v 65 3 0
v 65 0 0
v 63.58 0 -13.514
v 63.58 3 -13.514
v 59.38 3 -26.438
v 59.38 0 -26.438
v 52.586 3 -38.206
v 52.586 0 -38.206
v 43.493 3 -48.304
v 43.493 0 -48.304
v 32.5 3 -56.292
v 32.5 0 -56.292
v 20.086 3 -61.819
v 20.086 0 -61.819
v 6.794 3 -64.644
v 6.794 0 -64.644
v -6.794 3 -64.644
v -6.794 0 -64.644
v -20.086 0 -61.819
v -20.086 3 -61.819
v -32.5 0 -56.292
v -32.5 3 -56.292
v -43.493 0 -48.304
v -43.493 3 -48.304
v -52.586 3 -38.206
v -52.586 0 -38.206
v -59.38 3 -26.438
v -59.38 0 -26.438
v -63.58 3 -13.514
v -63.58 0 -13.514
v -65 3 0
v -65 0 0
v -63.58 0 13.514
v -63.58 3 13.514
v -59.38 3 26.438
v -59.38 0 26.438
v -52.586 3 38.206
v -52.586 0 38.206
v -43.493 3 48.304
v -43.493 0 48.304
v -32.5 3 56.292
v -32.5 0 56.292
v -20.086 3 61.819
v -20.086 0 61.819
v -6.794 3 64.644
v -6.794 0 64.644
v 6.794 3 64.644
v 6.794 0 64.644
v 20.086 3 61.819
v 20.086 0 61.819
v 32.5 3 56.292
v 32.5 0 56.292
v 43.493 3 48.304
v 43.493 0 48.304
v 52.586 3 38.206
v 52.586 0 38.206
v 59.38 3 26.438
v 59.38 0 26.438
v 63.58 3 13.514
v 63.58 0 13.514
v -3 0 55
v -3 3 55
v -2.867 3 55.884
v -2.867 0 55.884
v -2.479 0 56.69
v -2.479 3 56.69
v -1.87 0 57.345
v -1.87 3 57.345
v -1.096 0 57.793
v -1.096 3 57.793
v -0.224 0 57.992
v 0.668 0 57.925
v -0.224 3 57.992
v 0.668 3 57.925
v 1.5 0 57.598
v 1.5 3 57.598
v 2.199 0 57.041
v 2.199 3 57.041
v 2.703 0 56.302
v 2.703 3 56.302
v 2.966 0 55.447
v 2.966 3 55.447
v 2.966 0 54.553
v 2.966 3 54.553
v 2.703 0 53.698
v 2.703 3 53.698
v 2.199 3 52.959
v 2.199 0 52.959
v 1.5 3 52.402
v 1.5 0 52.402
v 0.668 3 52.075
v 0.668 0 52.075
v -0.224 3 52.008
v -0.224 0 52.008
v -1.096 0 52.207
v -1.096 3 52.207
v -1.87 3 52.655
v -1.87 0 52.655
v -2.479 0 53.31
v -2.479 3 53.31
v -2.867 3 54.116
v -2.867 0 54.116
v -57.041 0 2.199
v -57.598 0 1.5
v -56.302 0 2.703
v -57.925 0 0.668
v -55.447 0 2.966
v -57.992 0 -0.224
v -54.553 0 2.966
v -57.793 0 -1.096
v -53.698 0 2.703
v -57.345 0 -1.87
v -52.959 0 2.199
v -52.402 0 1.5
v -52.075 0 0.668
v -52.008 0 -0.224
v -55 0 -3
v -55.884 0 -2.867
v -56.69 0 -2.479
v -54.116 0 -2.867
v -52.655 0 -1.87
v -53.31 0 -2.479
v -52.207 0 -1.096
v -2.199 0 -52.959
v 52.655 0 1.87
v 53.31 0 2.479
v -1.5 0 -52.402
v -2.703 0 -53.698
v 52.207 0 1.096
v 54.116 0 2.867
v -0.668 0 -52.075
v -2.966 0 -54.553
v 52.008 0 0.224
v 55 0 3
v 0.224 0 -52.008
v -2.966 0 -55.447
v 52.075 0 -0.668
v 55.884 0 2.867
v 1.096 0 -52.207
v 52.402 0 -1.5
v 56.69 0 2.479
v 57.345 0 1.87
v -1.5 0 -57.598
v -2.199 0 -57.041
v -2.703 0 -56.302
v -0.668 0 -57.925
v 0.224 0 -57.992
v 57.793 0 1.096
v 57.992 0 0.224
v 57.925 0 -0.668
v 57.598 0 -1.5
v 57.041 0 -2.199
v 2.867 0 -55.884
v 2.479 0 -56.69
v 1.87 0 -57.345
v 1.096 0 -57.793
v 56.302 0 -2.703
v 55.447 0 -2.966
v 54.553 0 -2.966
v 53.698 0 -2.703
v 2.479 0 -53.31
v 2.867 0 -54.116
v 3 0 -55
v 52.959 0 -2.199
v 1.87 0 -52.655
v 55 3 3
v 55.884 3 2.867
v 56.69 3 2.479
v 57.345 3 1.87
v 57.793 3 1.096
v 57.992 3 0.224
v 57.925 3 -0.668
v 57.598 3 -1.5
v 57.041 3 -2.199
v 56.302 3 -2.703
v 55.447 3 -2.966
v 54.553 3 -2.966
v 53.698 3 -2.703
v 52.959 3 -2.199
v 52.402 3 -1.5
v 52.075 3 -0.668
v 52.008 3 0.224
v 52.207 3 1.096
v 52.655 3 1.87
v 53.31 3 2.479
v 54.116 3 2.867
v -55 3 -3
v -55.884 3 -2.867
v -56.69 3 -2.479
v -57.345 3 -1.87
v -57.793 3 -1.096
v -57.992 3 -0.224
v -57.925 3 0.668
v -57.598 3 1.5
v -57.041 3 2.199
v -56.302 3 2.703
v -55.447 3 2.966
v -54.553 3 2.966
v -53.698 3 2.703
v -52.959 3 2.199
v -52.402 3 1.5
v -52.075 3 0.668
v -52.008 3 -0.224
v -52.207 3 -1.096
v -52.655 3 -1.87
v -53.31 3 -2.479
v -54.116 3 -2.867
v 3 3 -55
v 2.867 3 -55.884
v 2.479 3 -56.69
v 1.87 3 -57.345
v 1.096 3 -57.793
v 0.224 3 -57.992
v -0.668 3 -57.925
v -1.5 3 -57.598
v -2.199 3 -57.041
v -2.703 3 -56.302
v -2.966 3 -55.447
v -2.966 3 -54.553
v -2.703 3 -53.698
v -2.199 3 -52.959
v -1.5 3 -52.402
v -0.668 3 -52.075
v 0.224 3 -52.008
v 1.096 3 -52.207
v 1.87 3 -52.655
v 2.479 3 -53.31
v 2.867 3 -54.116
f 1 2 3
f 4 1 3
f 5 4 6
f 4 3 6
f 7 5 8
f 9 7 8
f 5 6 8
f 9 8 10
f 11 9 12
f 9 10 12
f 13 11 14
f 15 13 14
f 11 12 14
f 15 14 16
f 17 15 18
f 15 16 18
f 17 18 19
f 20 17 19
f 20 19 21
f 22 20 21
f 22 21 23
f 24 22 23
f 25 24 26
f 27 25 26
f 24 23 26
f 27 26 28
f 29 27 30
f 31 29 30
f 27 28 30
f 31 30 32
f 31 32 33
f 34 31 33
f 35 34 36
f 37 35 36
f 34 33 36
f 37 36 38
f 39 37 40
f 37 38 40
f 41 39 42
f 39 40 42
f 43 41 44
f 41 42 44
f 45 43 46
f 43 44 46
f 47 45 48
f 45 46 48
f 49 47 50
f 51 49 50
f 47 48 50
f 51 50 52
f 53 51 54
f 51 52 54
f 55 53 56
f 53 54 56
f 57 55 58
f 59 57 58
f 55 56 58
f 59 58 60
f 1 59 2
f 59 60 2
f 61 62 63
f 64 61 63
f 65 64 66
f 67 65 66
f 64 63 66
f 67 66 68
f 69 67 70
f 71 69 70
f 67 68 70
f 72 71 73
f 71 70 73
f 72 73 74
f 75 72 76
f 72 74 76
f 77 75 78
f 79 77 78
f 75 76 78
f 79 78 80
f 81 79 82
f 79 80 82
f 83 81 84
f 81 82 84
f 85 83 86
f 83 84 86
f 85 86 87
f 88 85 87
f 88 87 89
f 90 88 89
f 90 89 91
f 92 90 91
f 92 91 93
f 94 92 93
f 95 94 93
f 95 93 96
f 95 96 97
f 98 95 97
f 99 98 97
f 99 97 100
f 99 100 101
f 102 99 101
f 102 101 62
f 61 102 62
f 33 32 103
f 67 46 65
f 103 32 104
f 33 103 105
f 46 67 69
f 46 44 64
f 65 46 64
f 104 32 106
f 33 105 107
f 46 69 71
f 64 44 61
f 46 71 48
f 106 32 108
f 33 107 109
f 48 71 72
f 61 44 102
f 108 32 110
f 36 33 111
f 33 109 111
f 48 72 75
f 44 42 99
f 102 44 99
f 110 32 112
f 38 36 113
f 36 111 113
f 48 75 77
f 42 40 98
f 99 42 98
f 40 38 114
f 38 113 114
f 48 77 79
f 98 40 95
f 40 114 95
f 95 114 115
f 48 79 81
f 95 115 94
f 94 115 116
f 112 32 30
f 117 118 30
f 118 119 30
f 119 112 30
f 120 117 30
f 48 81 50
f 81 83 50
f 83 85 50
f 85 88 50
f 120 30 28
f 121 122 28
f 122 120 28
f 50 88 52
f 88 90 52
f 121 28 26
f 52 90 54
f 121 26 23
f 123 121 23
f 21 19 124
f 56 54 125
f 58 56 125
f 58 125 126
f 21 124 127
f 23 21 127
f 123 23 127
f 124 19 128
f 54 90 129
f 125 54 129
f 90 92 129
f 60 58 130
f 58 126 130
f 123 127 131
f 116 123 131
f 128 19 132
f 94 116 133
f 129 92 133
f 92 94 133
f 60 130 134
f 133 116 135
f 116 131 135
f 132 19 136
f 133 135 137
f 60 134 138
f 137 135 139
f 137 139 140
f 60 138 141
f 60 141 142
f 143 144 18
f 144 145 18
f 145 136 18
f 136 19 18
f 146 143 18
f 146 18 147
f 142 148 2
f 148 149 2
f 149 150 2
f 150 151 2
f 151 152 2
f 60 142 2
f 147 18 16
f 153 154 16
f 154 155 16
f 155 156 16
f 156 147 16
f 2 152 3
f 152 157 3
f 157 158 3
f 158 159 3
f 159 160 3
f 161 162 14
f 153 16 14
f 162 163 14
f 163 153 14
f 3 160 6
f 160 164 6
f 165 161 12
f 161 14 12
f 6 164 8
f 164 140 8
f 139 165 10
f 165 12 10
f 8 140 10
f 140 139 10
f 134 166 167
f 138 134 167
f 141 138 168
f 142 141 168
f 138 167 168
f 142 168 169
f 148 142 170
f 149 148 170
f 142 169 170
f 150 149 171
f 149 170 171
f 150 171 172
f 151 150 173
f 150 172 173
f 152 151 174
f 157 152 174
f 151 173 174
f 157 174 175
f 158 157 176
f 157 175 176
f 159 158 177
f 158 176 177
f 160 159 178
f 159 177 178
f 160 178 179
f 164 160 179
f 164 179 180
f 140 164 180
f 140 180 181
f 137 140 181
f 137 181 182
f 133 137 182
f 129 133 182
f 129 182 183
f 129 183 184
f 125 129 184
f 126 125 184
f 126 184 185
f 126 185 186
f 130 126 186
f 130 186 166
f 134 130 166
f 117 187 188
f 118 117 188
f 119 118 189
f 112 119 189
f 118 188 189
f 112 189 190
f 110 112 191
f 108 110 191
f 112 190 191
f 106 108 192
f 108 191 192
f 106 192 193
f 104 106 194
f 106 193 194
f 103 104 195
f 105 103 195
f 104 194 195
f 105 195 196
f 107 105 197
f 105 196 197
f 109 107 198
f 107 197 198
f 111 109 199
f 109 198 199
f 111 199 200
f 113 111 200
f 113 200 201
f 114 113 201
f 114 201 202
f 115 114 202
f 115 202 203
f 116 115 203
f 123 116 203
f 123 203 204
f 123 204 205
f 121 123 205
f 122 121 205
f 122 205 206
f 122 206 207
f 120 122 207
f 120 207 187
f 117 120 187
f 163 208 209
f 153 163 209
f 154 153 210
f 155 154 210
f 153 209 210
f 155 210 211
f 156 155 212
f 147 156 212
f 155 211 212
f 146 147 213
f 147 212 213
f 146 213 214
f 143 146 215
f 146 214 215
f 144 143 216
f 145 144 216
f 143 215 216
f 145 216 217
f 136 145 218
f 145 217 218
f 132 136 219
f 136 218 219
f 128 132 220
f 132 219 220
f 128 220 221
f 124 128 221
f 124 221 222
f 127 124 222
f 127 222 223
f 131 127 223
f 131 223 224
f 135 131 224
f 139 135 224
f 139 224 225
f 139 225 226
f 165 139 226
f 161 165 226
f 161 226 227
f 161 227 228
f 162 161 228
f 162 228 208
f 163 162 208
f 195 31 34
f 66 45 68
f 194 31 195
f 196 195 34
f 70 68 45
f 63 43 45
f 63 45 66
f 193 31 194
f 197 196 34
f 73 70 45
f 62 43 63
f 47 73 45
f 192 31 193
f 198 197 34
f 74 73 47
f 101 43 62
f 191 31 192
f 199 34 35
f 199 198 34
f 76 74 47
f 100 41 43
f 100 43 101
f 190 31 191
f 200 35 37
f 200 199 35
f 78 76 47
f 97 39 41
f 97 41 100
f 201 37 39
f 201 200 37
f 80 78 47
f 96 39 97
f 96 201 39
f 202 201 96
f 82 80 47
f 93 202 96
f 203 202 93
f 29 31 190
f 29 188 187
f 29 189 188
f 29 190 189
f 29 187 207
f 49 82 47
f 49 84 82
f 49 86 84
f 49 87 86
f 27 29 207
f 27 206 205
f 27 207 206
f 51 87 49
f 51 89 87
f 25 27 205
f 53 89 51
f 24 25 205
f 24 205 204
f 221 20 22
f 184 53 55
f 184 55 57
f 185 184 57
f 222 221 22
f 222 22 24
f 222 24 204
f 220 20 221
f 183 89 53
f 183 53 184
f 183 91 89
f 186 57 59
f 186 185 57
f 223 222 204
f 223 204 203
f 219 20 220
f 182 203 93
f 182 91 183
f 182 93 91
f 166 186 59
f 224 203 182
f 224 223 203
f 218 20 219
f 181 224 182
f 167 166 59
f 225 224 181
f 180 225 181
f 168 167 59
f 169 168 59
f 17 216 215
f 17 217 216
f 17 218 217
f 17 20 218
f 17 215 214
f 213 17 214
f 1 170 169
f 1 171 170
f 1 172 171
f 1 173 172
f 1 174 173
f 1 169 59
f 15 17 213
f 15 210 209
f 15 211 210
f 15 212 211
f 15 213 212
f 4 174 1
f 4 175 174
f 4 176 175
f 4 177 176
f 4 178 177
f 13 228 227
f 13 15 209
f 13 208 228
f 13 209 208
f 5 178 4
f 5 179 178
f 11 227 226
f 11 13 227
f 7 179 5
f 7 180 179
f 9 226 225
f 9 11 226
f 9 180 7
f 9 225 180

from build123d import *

# Parameters (mm, degrees)
SKETCH1_R           = 65
BOSS_EXTRUDE1_DEPTH = 3
SKETCH2_R           = 3
CUT_EXTRUDE1_DEPTH  = 4
CIRPATTERN1_COUNT   = 4


with BuildPart() as part:
    # Sketch1 → Boss-Extrude1 (new body)
    with BuildSketch(Plane(origin=(0, 0, 0), x_dir=(1, 0, 0), z_dir=(0, 1, 0))):
        Circle(SKETCH1_R)
    extrude(amount=BOSS_EXTRUDE1_DEPTH)

    # Sketch2 → Cut-Extrude1 (cut, through all)
    with BuildSketch(Plane(origin=(0, 3, 0), x_dir=(1, 0, 0), z_dir=(0, 1, 0))):
        with Locations((0, 55)):
            Circle(SKETCH2_R)
    cut_extrude1 = extrude(amount=-CUT_EXTRUDE1_DEPTH, mode=Mode.SUBTRACT)

    # CirPattern1: Cut-Extrude1 ×4 about axis
    cirpattern1_axis = Axis((0, 0, 0), (0, 1, 0))
    for i in range(1, CIRPATTERN1_COUNT):
        add(cut_extrude1.rotate(cirpattern1_axis, i * 360 / CIRPATTERN1_COUNT), mode=Mode.SUBTRACT)


solid = part.part
